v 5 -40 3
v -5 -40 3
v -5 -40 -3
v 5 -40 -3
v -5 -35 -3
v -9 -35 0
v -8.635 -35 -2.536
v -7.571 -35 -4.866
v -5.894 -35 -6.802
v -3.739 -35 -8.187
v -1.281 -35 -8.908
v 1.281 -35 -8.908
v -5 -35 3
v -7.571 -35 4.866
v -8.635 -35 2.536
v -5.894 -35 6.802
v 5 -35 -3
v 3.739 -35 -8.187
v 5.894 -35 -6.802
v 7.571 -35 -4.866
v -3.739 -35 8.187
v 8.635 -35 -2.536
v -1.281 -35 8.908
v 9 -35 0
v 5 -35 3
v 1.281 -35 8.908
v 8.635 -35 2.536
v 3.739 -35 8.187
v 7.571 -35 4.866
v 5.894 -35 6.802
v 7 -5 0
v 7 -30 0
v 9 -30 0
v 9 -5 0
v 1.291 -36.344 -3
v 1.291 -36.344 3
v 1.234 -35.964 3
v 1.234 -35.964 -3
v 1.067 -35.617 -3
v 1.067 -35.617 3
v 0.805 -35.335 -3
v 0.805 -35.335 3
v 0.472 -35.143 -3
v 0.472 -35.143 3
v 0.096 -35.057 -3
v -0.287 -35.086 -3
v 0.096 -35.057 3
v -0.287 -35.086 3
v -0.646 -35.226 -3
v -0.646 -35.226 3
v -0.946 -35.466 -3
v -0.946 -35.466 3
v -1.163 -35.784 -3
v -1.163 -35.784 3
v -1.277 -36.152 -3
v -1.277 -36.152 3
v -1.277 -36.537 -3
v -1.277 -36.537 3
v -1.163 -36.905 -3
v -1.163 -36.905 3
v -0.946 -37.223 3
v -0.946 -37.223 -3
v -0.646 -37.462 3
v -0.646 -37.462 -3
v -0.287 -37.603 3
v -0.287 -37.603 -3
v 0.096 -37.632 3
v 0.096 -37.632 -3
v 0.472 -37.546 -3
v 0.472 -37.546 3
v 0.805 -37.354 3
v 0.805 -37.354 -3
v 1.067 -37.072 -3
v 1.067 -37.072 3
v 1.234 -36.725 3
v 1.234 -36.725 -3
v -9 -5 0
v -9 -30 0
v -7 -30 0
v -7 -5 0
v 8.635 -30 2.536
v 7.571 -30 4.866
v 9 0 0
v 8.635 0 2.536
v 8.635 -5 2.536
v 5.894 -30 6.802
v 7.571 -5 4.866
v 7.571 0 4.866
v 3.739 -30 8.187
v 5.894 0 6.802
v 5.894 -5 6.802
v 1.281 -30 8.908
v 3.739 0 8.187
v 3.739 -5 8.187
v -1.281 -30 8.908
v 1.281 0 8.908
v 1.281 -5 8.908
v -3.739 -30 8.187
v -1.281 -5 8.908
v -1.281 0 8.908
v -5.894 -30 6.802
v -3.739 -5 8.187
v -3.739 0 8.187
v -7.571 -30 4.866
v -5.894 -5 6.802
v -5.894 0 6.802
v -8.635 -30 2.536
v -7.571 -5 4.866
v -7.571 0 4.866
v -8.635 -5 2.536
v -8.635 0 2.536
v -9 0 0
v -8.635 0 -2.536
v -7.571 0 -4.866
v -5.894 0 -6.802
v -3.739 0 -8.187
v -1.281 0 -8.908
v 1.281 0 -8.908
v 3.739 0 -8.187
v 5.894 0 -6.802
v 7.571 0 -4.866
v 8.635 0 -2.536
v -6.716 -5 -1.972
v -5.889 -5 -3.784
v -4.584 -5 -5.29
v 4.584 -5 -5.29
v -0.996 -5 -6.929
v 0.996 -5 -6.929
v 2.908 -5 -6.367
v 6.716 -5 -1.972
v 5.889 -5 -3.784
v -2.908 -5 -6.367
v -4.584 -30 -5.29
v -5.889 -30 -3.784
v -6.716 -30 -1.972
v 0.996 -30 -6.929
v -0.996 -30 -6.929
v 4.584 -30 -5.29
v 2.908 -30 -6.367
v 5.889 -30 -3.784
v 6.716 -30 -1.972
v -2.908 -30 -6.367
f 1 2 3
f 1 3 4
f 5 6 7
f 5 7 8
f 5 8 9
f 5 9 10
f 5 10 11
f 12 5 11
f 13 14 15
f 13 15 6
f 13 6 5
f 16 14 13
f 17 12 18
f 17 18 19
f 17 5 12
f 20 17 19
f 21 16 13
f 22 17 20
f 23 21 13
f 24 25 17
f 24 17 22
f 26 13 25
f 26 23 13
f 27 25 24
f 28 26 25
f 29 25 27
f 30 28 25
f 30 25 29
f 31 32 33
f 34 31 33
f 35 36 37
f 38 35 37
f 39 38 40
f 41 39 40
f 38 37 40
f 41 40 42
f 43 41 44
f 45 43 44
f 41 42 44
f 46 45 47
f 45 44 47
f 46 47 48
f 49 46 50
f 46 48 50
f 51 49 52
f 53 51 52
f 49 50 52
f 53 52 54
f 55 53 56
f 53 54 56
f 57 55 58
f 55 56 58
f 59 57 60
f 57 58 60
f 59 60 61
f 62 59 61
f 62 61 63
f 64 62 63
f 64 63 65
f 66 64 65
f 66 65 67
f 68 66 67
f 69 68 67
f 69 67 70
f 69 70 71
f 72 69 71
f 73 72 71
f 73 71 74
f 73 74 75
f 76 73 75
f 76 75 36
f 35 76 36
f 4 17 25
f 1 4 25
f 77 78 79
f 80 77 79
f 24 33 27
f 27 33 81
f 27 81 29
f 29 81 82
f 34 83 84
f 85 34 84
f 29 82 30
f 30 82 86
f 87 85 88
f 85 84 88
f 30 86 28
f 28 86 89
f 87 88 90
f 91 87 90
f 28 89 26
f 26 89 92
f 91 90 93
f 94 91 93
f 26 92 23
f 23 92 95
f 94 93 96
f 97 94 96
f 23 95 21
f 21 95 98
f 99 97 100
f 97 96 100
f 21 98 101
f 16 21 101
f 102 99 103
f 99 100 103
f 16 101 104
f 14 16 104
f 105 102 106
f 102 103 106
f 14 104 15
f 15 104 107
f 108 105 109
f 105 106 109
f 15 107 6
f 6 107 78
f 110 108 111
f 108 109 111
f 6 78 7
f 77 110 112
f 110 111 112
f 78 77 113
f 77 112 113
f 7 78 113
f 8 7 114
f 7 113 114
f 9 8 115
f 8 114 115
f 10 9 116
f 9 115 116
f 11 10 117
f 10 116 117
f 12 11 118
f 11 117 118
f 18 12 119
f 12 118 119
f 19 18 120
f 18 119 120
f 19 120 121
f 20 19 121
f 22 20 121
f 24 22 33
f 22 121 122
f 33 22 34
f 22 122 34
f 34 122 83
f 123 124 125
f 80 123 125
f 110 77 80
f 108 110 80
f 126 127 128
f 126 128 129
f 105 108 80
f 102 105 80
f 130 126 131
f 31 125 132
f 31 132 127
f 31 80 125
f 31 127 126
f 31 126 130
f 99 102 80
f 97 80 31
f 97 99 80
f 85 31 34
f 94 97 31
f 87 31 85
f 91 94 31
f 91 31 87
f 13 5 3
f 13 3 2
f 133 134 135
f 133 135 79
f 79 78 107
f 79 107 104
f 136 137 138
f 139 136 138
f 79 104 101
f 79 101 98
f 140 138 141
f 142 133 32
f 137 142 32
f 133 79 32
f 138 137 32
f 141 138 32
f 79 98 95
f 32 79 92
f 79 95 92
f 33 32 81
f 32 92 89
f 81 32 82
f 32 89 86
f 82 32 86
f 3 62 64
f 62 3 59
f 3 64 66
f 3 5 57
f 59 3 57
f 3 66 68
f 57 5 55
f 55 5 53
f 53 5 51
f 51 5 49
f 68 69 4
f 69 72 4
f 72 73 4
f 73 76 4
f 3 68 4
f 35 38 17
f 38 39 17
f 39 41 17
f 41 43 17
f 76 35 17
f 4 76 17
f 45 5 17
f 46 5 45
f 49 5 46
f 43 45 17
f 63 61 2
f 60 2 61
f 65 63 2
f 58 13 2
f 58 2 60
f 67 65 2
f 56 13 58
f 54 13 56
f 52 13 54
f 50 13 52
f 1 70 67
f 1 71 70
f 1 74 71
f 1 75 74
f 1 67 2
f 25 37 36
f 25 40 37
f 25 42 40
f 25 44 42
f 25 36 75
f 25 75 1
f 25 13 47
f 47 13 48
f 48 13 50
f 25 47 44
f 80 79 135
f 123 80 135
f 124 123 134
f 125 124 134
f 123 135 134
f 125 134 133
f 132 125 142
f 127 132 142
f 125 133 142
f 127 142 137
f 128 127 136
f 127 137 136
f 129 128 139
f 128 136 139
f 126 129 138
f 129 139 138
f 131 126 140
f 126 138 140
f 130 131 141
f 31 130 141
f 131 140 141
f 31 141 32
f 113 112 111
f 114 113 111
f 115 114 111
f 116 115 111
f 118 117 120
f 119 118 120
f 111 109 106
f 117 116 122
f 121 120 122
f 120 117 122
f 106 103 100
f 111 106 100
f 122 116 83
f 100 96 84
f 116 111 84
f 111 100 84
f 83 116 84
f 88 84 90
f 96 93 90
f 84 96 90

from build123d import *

# Parameters (mm, degrees)
F0_R     = 9
F1_DEPTH = 35
F4_DEPTH = 25
F5_W     = 10
F5_H     = 6
F6_DEPTH = 5
F7_R     = 1.2910039075
F8_DEPTH = 25


with BuildPart() as f1:
    # F0 (on Front) → F1 (new body)
    with BuildSketch(Plane.XZ):
        Circle(F0_R)
    extrude(amount=F1_DEPTH)

    # F3 (on offset) → F4 (cut)
    with BuildSketch(Plane.XZ.offset(30)):
        with BuildLine():
            ThreePointArc((-7, 0), (0, 7), (7, 0))
            Line((7, 0), (10, 0))
            Line((10, 0), (10, 10))
            Line((10, 10), (-10, 10))
            Line((-10, 10), (-10, 0))
            Line((-10, 0), (-7, 0))
        make_face()
        with BuildLine():
            ThreePointArc((-7, 0), (0, -7), (7, 0))
            Line((7, 0), (-7, 0))
        make_face()
        with BuildLine():
            Line((-7, 0), (7, 0))
            ThreePointArc((7, 0), (0, 7), (-7, 0))
        make_face()
    extrude(amount=-F4_DEPTH, mode=Mode.SUBTRACT)

    # F5 (on face) → F6 (join)
    with BuildSketch(Plane.XZ.offset(35)):
        Rectangle(F5_W, F5_H)
    extrude(amount=F6_DEPTH)

    # F7 (on face) → F8 (cut)
    with BuildSketch(Plane.XY.offset(3)):
        with Locations((0, -36.3444052637)):
            Circle(F7_R)
    extrude(amount=-F8_DEPTH, mode=Mode.SUBTRACT)


solid = f1.part
